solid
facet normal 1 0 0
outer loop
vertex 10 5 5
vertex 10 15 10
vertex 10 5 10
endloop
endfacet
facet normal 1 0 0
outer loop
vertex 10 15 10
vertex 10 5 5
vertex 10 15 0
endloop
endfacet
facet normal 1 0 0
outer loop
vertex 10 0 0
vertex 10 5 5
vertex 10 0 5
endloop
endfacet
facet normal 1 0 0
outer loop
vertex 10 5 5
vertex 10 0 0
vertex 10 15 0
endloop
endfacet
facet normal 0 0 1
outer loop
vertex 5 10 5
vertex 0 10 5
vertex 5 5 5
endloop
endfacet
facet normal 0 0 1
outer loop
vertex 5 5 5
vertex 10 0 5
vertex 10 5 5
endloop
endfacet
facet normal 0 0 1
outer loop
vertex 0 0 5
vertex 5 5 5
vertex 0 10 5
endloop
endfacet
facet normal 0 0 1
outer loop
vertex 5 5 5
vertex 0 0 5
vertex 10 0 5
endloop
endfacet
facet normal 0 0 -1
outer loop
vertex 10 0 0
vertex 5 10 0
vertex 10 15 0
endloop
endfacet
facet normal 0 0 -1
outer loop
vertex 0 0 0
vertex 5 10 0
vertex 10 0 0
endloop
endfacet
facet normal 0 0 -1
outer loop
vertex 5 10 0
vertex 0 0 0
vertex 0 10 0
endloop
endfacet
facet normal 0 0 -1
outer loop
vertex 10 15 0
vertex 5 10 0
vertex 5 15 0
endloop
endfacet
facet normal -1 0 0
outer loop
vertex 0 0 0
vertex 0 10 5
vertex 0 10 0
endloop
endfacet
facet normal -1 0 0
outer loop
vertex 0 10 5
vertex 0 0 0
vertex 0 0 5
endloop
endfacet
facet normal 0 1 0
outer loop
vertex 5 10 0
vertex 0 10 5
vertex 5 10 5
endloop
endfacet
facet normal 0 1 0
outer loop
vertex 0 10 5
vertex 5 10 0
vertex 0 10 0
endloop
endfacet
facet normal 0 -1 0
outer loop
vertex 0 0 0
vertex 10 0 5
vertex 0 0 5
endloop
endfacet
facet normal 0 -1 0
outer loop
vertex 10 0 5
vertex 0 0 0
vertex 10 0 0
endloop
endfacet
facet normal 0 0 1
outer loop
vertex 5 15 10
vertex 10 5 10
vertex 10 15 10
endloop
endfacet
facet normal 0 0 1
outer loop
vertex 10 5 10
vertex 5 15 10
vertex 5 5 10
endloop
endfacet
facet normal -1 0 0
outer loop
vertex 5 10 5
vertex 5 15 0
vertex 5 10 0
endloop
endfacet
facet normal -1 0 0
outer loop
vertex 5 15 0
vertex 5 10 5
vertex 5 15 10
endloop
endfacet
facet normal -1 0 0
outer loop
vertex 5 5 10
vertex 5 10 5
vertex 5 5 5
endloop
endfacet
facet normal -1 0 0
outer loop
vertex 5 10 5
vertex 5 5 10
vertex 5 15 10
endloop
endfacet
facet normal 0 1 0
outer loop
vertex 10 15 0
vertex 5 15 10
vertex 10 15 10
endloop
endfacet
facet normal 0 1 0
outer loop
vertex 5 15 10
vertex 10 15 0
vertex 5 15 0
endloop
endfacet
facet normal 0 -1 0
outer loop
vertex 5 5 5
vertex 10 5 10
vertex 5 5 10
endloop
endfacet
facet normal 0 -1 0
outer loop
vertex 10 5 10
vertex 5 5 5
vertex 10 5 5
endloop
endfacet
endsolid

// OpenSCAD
cube(size = [10,10,5]);
translate([5, 5, 8.1-9+0.9]) cube(size = [5,10,10]);
